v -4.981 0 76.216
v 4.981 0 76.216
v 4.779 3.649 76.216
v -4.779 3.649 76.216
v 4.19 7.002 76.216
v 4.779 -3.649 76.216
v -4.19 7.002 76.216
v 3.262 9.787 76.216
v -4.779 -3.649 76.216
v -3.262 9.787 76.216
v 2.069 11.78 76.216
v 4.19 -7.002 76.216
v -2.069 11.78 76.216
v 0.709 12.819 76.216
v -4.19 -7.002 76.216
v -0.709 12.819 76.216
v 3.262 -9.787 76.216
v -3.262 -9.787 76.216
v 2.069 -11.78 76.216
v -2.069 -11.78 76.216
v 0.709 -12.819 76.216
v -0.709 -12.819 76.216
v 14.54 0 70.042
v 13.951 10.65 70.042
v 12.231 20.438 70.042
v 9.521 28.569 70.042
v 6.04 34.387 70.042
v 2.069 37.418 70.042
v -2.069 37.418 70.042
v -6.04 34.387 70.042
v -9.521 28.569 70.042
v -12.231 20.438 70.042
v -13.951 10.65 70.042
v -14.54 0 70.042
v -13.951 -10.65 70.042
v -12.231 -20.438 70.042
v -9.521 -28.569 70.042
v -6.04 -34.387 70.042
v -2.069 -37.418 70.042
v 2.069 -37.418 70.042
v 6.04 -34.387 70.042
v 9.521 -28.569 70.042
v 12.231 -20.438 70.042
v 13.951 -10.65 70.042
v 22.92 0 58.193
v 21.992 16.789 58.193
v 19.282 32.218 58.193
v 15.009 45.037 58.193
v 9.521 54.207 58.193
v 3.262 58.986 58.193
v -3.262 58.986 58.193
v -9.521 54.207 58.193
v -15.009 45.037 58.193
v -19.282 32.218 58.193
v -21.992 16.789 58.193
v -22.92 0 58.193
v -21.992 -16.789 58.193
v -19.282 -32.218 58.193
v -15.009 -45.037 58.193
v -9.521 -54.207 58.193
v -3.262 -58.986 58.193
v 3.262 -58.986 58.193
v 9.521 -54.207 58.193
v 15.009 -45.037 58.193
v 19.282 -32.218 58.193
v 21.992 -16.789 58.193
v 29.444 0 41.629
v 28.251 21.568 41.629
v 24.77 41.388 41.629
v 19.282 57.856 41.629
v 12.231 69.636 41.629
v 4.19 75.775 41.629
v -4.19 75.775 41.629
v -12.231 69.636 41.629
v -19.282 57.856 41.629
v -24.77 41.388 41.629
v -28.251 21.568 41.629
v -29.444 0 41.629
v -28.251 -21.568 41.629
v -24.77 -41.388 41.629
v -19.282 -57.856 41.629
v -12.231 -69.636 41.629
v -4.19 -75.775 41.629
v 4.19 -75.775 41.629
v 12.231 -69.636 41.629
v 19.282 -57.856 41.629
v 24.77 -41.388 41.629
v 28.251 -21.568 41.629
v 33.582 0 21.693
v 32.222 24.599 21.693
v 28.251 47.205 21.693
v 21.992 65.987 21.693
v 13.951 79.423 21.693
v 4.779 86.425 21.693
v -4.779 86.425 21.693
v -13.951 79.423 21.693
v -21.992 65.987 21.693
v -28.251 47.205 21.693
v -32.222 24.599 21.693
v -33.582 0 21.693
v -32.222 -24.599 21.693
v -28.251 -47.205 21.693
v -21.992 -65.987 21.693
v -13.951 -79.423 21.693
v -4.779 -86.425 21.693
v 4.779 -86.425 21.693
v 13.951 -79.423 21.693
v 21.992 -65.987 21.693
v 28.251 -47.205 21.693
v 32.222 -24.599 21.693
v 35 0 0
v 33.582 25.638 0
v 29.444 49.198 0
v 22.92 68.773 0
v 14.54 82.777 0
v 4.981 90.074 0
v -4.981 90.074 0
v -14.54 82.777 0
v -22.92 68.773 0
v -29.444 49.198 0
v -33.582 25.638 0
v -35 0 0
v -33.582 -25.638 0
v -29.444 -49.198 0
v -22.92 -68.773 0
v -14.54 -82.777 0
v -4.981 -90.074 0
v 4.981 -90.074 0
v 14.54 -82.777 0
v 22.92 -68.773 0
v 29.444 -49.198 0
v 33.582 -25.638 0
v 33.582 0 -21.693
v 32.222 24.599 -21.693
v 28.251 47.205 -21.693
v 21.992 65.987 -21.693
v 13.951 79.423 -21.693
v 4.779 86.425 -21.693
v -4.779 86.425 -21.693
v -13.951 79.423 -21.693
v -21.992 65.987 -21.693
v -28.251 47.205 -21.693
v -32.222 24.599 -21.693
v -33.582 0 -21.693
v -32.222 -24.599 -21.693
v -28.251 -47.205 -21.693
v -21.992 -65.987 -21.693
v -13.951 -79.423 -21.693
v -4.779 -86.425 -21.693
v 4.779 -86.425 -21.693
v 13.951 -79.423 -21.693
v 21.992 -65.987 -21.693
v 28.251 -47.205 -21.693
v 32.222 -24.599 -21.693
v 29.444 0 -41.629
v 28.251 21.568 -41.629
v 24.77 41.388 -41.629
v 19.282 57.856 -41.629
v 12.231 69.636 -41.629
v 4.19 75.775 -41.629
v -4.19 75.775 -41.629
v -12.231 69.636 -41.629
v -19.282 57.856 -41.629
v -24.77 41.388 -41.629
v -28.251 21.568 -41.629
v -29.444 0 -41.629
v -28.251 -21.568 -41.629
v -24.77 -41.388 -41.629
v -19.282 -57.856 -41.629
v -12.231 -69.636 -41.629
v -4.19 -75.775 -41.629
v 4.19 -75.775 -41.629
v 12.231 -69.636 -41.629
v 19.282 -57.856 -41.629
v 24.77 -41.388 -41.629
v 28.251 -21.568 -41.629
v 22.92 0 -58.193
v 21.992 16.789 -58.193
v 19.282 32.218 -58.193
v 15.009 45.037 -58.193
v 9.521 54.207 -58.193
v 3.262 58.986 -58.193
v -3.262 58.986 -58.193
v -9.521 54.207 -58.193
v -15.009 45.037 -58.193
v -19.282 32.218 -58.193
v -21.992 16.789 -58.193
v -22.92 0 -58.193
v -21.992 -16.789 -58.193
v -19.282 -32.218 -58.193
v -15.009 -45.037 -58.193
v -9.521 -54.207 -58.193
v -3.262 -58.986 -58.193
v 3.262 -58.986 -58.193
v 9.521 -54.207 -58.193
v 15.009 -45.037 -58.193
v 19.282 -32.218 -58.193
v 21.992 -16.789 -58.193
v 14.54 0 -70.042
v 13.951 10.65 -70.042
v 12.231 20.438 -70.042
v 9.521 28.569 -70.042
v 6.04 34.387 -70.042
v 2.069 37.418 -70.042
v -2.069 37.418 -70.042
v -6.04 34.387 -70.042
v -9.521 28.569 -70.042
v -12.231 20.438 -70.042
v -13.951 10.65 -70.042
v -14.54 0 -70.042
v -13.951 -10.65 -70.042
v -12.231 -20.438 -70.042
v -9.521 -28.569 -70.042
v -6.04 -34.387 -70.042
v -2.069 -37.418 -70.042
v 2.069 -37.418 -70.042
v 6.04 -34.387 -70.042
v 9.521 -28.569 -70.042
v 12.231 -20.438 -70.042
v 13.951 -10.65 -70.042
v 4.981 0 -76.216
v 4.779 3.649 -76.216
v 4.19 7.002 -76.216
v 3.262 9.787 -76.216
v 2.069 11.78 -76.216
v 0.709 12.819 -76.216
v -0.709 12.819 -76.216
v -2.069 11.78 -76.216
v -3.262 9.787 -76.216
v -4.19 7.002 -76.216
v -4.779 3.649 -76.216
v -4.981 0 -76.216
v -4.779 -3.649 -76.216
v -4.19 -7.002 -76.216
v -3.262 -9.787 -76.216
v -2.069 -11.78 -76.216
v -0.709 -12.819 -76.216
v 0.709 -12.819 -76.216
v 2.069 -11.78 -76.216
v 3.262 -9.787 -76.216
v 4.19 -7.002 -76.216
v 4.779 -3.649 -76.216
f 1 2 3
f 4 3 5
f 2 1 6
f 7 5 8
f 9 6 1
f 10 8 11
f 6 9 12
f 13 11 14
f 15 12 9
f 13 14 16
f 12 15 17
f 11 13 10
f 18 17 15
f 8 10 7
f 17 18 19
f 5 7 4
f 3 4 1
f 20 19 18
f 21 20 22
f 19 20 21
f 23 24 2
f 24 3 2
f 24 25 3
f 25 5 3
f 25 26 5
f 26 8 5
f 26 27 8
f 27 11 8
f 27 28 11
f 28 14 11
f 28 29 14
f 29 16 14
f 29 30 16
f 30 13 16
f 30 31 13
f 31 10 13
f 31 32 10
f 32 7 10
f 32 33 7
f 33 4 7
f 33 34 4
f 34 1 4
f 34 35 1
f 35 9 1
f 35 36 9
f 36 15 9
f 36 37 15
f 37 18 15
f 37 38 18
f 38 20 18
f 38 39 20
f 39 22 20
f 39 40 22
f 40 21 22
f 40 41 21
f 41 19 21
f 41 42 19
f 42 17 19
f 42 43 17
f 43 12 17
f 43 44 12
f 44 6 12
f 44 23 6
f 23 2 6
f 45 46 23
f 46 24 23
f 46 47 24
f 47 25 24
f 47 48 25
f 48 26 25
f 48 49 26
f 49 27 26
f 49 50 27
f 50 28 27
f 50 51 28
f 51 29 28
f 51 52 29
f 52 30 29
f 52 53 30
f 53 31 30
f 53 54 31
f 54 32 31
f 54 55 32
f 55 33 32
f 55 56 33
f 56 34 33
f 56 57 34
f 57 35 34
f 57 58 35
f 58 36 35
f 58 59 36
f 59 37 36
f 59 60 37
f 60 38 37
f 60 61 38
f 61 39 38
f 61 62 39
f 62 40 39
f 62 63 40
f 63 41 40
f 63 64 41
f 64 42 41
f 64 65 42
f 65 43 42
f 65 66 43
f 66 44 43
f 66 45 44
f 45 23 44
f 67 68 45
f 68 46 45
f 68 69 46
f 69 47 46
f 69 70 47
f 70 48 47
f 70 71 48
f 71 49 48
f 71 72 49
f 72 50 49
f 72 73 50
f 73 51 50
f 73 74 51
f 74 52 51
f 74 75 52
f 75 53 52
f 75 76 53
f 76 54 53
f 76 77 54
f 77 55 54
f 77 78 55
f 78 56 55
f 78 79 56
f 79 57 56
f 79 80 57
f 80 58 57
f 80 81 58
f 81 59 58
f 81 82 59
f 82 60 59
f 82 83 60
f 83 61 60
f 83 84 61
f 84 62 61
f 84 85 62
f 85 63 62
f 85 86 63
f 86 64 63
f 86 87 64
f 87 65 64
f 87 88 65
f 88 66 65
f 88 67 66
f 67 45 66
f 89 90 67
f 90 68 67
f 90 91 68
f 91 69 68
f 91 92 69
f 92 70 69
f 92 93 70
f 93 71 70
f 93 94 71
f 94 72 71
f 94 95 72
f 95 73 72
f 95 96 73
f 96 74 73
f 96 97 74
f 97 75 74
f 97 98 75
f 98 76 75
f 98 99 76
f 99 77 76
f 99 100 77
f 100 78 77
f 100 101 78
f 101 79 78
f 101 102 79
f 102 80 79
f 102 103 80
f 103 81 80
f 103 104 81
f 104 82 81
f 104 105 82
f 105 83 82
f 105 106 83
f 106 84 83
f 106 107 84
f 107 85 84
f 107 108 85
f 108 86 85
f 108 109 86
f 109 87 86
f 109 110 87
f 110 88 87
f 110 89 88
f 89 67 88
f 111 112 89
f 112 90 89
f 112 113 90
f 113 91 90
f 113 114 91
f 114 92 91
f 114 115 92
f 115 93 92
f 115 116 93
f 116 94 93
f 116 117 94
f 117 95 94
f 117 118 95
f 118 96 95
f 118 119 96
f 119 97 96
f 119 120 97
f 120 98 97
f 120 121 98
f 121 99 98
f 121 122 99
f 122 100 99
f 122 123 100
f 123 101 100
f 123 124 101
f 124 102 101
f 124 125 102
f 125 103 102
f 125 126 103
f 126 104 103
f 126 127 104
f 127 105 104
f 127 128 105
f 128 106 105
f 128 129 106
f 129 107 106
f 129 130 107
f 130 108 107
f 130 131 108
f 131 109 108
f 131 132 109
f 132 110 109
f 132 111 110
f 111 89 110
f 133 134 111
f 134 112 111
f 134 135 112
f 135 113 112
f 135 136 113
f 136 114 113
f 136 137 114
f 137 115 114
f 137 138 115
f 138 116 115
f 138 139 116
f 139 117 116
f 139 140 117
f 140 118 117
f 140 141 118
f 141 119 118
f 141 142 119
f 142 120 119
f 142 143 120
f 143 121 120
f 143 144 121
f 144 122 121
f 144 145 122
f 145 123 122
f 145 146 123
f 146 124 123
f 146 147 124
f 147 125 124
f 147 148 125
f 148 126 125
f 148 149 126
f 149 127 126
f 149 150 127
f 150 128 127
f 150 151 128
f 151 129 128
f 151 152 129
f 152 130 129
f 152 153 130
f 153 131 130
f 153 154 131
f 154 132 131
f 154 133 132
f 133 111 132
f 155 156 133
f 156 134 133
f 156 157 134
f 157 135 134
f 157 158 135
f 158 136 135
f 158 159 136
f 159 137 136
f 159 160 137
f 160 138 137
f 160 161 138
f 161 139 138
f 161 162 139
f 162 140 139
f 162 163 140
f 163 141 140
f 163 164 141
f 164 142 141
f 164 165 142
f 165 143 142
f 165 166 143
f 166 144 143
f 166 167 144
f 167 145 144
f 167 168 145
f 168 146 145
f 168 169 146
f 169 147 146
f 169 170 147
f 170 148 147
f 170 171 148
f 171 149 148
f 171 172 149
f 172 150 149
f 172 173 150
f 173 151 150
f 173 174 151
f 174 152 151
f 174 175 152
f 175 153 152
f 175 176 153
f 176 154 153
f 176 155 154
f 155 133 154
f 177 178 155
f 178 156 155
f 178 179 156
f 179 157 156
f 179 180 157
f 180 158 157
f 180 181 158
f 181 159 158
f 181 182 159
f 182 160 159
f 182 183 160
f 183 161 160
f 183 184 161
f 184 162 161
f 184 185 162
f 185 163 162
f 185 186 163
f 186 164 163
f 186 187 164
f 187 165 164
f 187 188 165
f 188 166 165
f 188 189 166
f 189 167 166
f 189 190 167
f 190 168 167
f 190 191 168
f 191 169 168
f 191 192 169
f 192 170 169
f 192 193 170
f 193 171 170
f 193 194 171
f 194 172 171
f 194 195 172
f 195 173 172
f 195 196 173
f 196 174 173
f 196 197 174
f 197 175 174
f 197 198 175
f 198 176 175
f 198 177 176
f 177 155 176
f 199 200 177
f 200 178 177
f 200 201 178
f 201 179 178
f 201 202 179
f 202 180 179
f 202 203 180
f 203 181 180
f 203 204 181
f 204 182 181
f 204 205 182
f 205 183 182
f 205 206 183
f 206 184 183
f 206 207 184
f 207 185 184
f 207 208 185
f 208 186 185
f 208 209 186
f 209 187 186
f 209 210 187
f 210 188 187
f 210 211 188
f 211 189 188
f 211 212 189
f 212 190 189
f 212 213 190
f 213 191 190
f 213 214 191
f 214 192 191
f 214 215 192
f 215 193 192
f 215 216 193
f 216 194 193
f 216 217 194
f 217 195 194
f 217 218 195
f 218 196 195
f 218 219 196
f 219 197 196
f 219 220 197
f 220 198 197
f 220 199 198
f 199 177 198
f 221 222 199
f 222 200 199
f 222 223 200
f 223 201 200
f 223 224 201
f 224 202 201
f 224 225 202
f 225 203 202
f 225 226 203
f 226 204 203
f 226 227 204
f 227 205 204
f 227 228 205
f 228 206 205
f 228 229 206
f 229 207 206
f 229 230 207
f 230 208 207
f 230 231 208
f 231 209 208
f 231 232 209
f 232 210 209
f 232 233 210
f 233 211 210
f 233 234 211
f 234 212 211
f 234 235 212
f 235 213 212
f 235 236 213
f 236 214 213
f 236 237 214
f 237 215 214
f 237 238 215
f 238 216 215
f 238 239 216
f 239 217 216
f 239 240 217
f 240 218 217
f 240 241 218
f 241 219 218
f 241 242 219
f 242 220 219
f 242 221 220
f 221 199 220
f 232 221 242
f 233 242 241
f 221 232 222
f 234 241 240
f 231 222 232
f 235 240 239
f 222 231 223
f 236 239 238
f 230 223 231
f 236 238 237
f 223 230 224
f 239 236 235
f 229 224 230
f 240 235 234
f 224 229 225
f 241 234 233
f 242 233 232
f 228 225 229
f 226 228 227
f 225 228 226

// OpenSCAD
// Generated by SolidPython 1.0.1 on 2020-07-29 00:46:46


scale(v = [5, 13, 11]) {
	sphere(r = 7);
}
/***********************************************
*********      SolidPython code:      **********
************************************************
 
# import packages: SolidPython
from solid import *
from solid.utils import *
from itertools import chain, combinations, permutations


class Resize:

    def __init__(self, scad_file):
        self.scad_file = scad_file
        #self.scad_file = import_scad(scad_file)
        # cone/cylinder param:
        self.r1 = 0
        self.r2 = 0
        self.h = 0
        # rectangular prism param:
        self.w = 0
        self.l = 0
        # ellipse param:
        self.r = 0

    # import OpenScad code (file name corresponds to shape)


    # classify shape + parameters
    def assign(self, param1, param2, param3):
        if self.scad_file == 'cone.scad':
            self.r1 = param1
            self.r2 = param2
            self.h = param3
        elif self.scad_file == 'cylinder.scad':
            self.r1 = param1
            self.r2 = param2
            self.h = param3
        elif self.scad_file == 'rectangularPrism.scad':
            self.h = param1
            self.l = param2
            self.w = param3
        else:
            self.r = param1
            self.h = param2

    # resize parameters
    def iterate(self):
        x = range(3, 20, 2)
        i = 1
        if self.scad_file == 'cone.scad':
            tempList = list(permutations(x, 2))
            for temp in tempList:
                param1 = temp[0]
                param2 = temp[1]
                filepath = 'produced_scad_files/' + 'cone' + str(param1) + '_' + str(param2) + '_' + '.scad'
                scad_render_to_file(cylinder(h=param1, r1=param2, r2=0), filepath)

        elif self.scad_file == 'cylinder.scad':
            tempList = list(permutations(x, 3))
            for temp in tempList:
                param1 = temp[0]
                param2 = temp[1]
                filepath = 'produced_scad_files/' + 'cylinder' + str(param1) + '_' + str(param2) + '_' + '.scad'
                scad_render_to_file(cylinder(h=param1, r1=param2, r2=param2), filepath)

        elif self.scad_file == 'rectangularPrism.scad':
            tempList = list(permutations(x, 3))
            for temp in tempList:
                param1 = temp[0]
                param2 = temp[1]
                param3 = temp[2]
                filepath = 'produced_scad_files/' + 'rectangularPrism' + str(param1) + '_' + str(param2) + '_' + str(
                    param3) + '.scad'
                scad_render_to_file(cube(size=(param1, param2, param3)), filepath)

        elif self.scad_file == 'ellipse.scad':
            tempList = list(permutations(x, 4))
            for temp in tempList:
                param1 = temp[0]
                param2 = temp[1]
                param3 = temp[2]
                param4 = temp[3]
                filepath = 'produced_scad_files/' + 'ellipse' + str(param1) + '_' + str(param2) + '_' + str(param3) + '_' + str(param4) + '.scad'
                scad_render_to_file(scale([param1, param2, param3])(sphere(r=param4)), filepath)

    def render_to_scadfile(self):
        scad_render_to_file(scad, 'example.scad') 
 
************************************************/
